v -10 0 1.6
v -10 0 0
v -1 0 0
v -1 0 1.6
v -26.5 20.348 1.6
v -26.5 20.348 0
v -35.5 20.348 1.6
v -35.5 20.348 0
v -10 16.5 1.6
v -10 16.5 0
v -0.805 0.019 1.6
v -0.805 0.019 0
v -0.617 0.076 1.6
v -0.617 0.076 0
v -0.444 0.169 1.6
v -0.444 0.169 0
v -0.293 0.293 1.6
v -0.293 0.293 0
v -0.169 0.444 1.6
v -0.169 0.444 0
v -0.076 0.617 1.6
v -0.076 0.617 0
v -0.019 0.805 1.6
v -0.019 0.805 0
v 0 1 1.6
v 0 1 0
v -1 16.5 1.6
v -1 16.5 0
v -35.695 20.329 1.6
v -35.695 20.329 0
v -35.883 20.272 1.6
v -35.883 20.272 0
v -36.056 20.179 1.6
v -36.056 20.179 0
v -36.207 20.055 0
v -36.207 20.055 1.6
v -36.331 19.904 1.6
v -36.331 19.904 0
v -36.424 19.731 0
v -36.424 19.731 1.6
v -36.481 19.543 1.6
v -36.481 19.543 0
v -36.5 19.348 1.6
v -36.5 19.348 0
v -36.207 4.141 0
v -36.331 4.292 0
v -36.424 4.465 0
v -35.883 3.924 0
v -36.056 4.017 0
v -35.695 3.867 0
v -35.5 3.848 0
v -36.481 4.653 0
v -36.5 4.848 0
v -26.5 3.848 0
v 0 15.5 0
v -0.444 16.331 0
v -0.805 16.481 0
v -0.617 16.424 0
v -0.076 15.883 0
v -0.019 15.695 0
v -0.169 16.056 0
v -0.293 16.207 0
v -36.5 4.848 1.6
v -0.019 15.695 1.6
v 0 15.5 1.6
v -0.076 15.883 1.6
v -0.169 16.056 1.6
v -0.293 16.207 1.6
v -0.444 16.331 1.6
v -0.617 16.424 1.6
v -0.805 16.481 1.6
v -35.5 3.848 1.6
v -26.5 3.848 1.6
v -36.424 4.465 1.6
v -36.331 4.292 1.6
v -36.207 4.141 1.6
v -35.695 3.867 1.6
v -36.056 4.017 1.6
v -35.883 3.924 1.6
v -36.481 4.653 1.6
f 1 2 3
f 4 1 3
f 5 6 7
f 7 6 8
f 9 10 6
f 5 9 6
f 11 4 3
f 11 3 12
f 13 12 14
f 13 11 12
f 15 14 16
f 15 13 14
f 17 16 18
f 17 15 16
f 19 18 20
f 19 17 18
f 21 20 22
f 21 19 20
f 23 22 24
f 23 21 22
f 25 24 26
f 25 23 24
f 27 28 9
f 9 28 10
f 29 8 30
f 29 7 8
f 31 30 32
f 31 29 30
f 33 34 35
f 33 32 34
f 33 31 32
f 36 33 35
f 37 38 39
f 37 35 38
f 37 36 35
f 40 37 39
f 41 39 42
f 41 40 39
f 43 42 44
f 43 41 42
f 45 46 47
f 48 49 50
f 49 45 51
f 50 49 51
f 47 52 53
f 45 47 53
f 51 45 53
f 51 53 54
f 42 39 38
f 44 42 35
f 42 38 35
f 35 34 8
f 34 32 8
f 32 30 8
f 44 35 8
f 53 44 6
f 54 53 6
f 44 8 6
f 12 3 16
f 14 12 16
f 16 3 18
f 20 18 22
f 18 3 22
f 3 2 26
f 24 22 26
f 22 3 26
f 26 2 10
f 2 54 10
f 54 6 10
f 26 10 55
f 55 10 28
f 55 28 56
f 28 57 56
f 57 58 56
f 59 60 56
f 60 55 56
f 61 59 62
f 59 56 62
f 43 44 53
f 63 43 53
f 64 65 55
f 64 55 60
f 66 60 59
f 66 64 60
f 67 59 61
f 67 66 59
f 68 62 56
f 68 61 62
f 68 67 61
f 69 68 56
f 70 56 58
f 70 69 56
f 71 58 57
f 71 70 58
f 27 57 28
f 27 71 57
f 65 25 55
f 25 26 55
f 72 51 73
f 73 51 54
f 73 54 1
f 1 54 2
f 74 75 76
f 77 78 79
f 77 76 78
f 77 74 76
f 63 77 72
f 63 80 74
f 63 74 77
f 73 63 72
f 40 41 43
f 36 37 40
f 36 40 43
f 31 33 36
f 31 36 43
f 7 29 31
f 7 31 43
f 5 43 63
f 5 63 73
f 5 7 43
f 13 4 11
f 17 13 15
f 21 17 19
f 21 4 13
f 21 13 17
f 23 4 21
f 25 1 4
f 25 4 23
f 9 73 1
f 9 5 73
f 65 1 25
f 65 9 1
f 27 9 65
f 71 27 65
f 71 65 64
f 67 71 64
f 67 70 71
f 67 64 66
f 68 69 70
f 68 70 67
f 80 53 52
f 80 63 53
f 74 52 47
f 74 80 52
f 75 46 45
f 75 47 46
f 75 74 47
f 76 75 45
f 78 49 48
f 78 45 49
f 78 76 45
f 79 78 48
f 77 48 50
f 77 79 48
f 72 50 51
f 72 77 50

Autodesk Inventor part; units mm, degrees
ref_plane "YZ Plane" through (0, 0, 0) normal (1, 0, 0) x (0, 1, 0)
ref_plane "XZ Plane" through (0, 0, 0) normal (0, 1, 0) x (-1, 0, 0)
ref_plane "XY Plane" through (0, 0, 0) normal (0, 0, 1) x (1, 0, 0)
sketch "Sketch1" plane through (0, 0, 0) normal (0, 0, 1) x (1, 0, 0)
  line L0 (0, 0) -> (0, 16.5)
  line L1 (0, 16.5) -> (-10, 16.5)
  line L2 (-10, 16.5) -> (-26.5, 20.348)
  line L3 (-26.5, 20.348) -> (-36.5, 20.348)
  line L4 (-36.5, 20.348) -> (-36.5, 3.848)
  line L5 (-36.5, 3.848) -> (-26.5, 3.848)
  line L6 (-26.5, 3.848) -> (-10, 0)
  line L7 (-10, 0) -> (0, 0)
  dimension "d0" = 10
  dimension "d1" = 10
  dimension "d2" = 10
  dimension "d3" = 10
  dimension "d4" = 3.848
  dimension "d5" = 36.5
  dimension "d6" = 16.5
extrude "Extrusion1" add sketch "Sketch1" along normal blind 1.6
sketch "Sketch2" plane through (0, 0, 1.6) normal (0, 0, 1) x (1, 0, 0)
  line L0 (-7.4638, 8.25) -> (0, 8.25)
  line L1 (0, 0) -> (0, 16.5) projected
  line L2 (-36.5, 20.348) -> (-36.5, 3.848) projected
  line L3 (-36.5, 12.098) -> (-30.2249, 12.098)
  line L4 (-26.5, 20.348) -> (-36.5, 20.348) projected
  line L5 (-31.9735, 20.348) -> (-31.9735, 3.848)
  line L6 (-4.5265, 16.5) -> (-4.5265, 0)
  line L7 (-10, 0) -> (0, 0) projected
  line L8 (0, 16.5) -> (-10, 16.5) projected
  dimension "d9" = 16.5
  dimension "d12" = 27.447
  dimension "d13" = 36.5
  dimension "d14" = 4.5265
fillet "Fillet1" radius 1 4 edges at (-36.5, 20.348, 0.8) (-36.5, 3.848, 0.8) (0, 0, 0.8) (0, 16.5, 0.8)
sketch "OUTLINE" plane through (0, 0, 1.6) normal (0, 0, 1) x (1, 0, 0)
  arc A0 (0, 15.5) -> (-1, 16.5) centre (-1, 15.5) ccw projected
  line L0 (-1, 16.5) -> (-10, 16.5) projected
  line L1 (-10, 16.5) -> (-26.5, 20.348) projected
  line L2 (-26.5, 20.348) -> (-35.5, 20.348) projected
  arc A1 (-35.5, 20.348) -> (-36.5, 19.348) centre (-35.5, 19.348) ccw projected
  line L3 (-36.5, 19.348) -> (-36.5, 4.848) projected
  arc A2 (-36.5, 4.848) -> (-35.5, 3.848) centre (-35.5, 4.848) ccw projected
  line L4 (-35.5, 3.848) -> (-26.5, 3.848) projected
  line L5 (-26.5, 3.848) -> (-10, 0) projected
  line L6 (-10, 0) -> (-1, 0) projected
  arc A3 (-1, 0) -> (0, 1) centre (-1, 1) ccw projected
  line L7 (0, 1) -> (0, 15.5) projected
  point P0 (0, 0)
sketch "EXTRA" plane through (0, 0, 1.6) normal (0, 0, 1) x (1, 0, 0)
  circle A0 centre (-3.0265, 2.25) radius 0.49 projected
  circle A1 centre (-6.0265, 14.25) radius 0.49 projected
  circle A2 centre (-30.4735, 6.098) radius 0.5193 projected
  circle A3 centre (-33.4735, 18.098) radius 0.5193 projected
  circle A4 centre (-6.0265, 2.25) radius 0.49
  circle A5 centre (-3.0265, 14.25) radius 0.49
  circle A6 centre (-30.4735, 18.098) radius 0.49
  circle A7 centre (-33.4735, 6.098) radius 0.49
  point P0 (0, 0)
equation "\"d1\" = d0"
equation "\"d2\" = d1"
equation "\"d3\" = d0"
equation "\"d14\" = -0.5 * d12 + 0.5 * d13"
properties part number "DB2_Bridge"
